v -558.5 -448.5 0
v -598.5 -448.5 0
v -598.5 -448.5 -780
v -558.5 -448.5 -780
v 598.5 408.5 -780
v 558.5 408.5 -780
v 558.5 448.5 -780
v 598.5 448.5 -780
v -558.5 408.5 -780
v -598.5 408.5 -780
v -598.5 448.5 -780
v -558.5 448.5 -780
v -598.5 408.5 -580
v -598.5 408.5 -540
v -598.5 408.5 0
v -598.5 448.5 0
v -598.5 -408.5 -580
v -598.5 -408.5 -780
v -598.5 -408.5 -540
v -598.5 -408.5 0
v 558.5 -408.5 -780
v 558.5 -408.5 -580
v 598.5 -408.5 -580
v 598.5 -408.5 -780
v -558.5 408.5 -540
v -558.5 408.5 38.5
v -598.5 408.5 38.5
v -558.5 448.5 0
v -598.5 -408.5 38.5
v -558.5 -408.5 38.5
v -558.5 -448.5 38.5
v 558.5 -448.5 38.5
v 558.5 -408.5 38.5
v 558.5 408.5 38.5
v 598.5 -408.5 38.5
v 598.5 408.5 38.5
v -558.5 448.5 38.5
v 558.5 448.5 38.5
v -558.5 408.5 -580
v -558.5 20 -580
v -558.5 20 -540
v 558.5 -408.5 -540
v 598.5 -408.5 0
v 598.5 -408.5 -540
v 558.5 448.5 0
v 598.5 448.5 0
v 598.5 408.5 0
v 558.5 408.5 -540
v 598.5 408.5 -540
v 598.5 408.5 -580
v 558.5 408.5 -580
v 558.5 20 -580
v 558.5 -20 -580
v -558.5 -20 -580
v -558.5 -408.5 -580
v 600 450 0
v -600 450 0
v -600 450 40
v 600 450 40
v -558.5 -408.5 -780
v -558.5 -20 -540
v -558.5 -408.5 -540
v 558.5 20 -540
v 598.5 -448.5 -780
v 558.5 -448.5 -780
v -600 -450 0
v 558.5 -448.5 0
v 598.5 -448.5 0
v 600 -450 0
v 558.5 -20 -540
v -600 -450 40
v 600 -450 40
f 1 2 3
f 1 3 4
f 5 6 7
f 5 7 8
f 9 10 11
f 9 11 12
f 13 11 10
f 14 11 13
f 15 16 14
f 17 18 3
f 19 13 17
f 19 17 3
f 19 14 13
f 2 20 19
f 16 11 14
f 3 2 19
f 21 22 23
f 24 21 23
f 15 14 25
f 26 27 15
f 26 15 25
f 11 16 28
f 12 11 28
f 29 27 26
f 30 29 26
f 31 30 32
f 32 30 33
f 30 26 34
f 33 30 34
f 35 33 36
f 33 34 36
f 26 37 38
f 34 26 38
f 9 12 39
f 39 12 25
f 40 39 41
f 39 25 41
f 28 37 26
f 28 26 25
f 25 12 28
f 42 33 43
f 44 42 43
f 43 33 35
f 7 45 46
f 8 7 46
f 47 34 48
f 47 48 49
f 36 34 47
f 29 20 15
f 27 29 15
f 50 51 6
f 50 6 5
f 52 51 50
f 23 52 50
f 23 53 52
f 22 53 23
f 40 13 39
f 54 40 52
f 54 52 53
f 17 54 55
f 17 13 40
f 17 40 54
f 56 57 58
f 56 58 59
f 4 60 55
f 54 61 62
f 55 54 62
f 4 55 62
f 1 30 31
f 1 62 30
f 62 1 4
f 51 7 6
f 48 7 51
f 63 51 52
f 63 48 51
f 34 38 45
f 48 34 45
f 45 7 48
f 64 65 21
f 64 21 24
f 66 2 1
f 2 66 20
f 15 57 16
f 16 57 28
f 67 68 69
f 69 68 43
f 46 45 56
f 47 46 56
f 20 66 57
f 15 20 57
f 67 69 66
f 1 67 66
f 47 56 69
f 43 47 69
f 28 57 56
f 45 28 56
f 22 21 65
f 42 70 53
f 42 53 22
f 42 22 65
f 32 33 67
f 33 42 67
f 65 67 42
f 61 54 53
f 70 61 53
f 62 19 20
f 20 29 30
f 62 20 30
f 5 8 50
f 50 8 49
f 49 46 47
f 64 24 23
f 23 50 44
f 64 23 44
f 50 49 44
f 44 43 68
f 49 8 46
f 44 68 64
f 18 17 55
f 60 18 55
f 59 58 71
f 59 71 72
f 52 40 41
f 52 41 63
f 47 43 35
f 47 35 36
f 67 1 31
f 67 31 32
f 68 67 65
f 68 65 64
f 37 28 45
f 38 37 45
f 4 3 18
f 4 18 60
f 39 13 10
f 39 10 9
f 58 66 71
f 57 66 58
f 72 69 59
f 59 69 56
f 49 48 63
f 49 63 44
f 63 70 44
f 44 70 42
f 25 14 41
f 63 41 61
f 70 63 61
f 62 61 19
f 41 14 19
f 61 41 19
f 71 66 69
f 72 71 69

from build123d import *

# Parameters (mm, degrees)
F0_W      = 1200
F0_H      = 900
F1_DEPTH  = 40
F2_T      = -1.5
F3_W      = 40
F3_H      = 40
F4_DEPTH  = 818.5
F5_W      = 817
F5_H      = 40
F6_DEPTH  = 40
F7_W      = 817
F7_H      = 40
F8_DEPTH  = 40
F9_W      = 1117
F9_H      = 40
F10_DEPTH = 40


with BuildPart() as f1:
    # F0 (on Top) → F1 (new body)
    with BuildSketch(Plane.XY):
        Rectangle(F0_W, F0_H)
    extrude(amount=F1_DEPTH)

    # F2
    f2_openings = [f1.faces().sort_by_distance(p)[0] for p in [
        (0, 0, 0),
    ]]
    offset(amount=F2_T, openings=f2_openings)

    # F3 (on face) → F4 (join)
    with BuildSketch(Plane(origin=(0, 0, 38.5), x_dir=(1, 0, 0), z_dir=(0, 0, -1))):
        with Locations((-578.5, 428.5)):
            Rectangle(F3_W, F3_H)
        with Locations((578.5, 428.5)):
            Rectangle(F3_W, F3_H)
        with Locations((578.5, -428.5)):
            Rectangle(F3_W, F3_H)
        with Locations((-578.5, -428.5)):
            Rectangle(F3_W, F3_H)
    extrude(amount=F4_DEPTH)

    # F5 (on face) → F6 (join)
    with BuildSketch(Plane(origin=(-598.5, 0, 0), x_dir=(0, -1, 0), z_dir=(-1, 0, 0))):
        with Locations((0, -560)):
            Rectangle(F5_W, F5_H)
    extrude(amount=-F6_DEPTH)

    # F7 (on face) → F8 (join)
    with BuildSketch(Plane(origin=(558.5, 0, 0), x_dir=(0, -1, 0), z_dir=(-1, 0, 0))):
        with Locations((0, -560)):
            Rectangle(F7_W, F7_H)
    extrude(amount=-F8_DEPTH)

    # F9 (on face) → F10 (join)
    with BuildSketch(Plane(origin=(0, 0, -580), x_dir=(1, 0, 0), z_dir=(0, 0, -1))):
        Rectangle(F9_W, F9_H)
    extrude(amount=-F10_DEPTH)


solid = f1.part
